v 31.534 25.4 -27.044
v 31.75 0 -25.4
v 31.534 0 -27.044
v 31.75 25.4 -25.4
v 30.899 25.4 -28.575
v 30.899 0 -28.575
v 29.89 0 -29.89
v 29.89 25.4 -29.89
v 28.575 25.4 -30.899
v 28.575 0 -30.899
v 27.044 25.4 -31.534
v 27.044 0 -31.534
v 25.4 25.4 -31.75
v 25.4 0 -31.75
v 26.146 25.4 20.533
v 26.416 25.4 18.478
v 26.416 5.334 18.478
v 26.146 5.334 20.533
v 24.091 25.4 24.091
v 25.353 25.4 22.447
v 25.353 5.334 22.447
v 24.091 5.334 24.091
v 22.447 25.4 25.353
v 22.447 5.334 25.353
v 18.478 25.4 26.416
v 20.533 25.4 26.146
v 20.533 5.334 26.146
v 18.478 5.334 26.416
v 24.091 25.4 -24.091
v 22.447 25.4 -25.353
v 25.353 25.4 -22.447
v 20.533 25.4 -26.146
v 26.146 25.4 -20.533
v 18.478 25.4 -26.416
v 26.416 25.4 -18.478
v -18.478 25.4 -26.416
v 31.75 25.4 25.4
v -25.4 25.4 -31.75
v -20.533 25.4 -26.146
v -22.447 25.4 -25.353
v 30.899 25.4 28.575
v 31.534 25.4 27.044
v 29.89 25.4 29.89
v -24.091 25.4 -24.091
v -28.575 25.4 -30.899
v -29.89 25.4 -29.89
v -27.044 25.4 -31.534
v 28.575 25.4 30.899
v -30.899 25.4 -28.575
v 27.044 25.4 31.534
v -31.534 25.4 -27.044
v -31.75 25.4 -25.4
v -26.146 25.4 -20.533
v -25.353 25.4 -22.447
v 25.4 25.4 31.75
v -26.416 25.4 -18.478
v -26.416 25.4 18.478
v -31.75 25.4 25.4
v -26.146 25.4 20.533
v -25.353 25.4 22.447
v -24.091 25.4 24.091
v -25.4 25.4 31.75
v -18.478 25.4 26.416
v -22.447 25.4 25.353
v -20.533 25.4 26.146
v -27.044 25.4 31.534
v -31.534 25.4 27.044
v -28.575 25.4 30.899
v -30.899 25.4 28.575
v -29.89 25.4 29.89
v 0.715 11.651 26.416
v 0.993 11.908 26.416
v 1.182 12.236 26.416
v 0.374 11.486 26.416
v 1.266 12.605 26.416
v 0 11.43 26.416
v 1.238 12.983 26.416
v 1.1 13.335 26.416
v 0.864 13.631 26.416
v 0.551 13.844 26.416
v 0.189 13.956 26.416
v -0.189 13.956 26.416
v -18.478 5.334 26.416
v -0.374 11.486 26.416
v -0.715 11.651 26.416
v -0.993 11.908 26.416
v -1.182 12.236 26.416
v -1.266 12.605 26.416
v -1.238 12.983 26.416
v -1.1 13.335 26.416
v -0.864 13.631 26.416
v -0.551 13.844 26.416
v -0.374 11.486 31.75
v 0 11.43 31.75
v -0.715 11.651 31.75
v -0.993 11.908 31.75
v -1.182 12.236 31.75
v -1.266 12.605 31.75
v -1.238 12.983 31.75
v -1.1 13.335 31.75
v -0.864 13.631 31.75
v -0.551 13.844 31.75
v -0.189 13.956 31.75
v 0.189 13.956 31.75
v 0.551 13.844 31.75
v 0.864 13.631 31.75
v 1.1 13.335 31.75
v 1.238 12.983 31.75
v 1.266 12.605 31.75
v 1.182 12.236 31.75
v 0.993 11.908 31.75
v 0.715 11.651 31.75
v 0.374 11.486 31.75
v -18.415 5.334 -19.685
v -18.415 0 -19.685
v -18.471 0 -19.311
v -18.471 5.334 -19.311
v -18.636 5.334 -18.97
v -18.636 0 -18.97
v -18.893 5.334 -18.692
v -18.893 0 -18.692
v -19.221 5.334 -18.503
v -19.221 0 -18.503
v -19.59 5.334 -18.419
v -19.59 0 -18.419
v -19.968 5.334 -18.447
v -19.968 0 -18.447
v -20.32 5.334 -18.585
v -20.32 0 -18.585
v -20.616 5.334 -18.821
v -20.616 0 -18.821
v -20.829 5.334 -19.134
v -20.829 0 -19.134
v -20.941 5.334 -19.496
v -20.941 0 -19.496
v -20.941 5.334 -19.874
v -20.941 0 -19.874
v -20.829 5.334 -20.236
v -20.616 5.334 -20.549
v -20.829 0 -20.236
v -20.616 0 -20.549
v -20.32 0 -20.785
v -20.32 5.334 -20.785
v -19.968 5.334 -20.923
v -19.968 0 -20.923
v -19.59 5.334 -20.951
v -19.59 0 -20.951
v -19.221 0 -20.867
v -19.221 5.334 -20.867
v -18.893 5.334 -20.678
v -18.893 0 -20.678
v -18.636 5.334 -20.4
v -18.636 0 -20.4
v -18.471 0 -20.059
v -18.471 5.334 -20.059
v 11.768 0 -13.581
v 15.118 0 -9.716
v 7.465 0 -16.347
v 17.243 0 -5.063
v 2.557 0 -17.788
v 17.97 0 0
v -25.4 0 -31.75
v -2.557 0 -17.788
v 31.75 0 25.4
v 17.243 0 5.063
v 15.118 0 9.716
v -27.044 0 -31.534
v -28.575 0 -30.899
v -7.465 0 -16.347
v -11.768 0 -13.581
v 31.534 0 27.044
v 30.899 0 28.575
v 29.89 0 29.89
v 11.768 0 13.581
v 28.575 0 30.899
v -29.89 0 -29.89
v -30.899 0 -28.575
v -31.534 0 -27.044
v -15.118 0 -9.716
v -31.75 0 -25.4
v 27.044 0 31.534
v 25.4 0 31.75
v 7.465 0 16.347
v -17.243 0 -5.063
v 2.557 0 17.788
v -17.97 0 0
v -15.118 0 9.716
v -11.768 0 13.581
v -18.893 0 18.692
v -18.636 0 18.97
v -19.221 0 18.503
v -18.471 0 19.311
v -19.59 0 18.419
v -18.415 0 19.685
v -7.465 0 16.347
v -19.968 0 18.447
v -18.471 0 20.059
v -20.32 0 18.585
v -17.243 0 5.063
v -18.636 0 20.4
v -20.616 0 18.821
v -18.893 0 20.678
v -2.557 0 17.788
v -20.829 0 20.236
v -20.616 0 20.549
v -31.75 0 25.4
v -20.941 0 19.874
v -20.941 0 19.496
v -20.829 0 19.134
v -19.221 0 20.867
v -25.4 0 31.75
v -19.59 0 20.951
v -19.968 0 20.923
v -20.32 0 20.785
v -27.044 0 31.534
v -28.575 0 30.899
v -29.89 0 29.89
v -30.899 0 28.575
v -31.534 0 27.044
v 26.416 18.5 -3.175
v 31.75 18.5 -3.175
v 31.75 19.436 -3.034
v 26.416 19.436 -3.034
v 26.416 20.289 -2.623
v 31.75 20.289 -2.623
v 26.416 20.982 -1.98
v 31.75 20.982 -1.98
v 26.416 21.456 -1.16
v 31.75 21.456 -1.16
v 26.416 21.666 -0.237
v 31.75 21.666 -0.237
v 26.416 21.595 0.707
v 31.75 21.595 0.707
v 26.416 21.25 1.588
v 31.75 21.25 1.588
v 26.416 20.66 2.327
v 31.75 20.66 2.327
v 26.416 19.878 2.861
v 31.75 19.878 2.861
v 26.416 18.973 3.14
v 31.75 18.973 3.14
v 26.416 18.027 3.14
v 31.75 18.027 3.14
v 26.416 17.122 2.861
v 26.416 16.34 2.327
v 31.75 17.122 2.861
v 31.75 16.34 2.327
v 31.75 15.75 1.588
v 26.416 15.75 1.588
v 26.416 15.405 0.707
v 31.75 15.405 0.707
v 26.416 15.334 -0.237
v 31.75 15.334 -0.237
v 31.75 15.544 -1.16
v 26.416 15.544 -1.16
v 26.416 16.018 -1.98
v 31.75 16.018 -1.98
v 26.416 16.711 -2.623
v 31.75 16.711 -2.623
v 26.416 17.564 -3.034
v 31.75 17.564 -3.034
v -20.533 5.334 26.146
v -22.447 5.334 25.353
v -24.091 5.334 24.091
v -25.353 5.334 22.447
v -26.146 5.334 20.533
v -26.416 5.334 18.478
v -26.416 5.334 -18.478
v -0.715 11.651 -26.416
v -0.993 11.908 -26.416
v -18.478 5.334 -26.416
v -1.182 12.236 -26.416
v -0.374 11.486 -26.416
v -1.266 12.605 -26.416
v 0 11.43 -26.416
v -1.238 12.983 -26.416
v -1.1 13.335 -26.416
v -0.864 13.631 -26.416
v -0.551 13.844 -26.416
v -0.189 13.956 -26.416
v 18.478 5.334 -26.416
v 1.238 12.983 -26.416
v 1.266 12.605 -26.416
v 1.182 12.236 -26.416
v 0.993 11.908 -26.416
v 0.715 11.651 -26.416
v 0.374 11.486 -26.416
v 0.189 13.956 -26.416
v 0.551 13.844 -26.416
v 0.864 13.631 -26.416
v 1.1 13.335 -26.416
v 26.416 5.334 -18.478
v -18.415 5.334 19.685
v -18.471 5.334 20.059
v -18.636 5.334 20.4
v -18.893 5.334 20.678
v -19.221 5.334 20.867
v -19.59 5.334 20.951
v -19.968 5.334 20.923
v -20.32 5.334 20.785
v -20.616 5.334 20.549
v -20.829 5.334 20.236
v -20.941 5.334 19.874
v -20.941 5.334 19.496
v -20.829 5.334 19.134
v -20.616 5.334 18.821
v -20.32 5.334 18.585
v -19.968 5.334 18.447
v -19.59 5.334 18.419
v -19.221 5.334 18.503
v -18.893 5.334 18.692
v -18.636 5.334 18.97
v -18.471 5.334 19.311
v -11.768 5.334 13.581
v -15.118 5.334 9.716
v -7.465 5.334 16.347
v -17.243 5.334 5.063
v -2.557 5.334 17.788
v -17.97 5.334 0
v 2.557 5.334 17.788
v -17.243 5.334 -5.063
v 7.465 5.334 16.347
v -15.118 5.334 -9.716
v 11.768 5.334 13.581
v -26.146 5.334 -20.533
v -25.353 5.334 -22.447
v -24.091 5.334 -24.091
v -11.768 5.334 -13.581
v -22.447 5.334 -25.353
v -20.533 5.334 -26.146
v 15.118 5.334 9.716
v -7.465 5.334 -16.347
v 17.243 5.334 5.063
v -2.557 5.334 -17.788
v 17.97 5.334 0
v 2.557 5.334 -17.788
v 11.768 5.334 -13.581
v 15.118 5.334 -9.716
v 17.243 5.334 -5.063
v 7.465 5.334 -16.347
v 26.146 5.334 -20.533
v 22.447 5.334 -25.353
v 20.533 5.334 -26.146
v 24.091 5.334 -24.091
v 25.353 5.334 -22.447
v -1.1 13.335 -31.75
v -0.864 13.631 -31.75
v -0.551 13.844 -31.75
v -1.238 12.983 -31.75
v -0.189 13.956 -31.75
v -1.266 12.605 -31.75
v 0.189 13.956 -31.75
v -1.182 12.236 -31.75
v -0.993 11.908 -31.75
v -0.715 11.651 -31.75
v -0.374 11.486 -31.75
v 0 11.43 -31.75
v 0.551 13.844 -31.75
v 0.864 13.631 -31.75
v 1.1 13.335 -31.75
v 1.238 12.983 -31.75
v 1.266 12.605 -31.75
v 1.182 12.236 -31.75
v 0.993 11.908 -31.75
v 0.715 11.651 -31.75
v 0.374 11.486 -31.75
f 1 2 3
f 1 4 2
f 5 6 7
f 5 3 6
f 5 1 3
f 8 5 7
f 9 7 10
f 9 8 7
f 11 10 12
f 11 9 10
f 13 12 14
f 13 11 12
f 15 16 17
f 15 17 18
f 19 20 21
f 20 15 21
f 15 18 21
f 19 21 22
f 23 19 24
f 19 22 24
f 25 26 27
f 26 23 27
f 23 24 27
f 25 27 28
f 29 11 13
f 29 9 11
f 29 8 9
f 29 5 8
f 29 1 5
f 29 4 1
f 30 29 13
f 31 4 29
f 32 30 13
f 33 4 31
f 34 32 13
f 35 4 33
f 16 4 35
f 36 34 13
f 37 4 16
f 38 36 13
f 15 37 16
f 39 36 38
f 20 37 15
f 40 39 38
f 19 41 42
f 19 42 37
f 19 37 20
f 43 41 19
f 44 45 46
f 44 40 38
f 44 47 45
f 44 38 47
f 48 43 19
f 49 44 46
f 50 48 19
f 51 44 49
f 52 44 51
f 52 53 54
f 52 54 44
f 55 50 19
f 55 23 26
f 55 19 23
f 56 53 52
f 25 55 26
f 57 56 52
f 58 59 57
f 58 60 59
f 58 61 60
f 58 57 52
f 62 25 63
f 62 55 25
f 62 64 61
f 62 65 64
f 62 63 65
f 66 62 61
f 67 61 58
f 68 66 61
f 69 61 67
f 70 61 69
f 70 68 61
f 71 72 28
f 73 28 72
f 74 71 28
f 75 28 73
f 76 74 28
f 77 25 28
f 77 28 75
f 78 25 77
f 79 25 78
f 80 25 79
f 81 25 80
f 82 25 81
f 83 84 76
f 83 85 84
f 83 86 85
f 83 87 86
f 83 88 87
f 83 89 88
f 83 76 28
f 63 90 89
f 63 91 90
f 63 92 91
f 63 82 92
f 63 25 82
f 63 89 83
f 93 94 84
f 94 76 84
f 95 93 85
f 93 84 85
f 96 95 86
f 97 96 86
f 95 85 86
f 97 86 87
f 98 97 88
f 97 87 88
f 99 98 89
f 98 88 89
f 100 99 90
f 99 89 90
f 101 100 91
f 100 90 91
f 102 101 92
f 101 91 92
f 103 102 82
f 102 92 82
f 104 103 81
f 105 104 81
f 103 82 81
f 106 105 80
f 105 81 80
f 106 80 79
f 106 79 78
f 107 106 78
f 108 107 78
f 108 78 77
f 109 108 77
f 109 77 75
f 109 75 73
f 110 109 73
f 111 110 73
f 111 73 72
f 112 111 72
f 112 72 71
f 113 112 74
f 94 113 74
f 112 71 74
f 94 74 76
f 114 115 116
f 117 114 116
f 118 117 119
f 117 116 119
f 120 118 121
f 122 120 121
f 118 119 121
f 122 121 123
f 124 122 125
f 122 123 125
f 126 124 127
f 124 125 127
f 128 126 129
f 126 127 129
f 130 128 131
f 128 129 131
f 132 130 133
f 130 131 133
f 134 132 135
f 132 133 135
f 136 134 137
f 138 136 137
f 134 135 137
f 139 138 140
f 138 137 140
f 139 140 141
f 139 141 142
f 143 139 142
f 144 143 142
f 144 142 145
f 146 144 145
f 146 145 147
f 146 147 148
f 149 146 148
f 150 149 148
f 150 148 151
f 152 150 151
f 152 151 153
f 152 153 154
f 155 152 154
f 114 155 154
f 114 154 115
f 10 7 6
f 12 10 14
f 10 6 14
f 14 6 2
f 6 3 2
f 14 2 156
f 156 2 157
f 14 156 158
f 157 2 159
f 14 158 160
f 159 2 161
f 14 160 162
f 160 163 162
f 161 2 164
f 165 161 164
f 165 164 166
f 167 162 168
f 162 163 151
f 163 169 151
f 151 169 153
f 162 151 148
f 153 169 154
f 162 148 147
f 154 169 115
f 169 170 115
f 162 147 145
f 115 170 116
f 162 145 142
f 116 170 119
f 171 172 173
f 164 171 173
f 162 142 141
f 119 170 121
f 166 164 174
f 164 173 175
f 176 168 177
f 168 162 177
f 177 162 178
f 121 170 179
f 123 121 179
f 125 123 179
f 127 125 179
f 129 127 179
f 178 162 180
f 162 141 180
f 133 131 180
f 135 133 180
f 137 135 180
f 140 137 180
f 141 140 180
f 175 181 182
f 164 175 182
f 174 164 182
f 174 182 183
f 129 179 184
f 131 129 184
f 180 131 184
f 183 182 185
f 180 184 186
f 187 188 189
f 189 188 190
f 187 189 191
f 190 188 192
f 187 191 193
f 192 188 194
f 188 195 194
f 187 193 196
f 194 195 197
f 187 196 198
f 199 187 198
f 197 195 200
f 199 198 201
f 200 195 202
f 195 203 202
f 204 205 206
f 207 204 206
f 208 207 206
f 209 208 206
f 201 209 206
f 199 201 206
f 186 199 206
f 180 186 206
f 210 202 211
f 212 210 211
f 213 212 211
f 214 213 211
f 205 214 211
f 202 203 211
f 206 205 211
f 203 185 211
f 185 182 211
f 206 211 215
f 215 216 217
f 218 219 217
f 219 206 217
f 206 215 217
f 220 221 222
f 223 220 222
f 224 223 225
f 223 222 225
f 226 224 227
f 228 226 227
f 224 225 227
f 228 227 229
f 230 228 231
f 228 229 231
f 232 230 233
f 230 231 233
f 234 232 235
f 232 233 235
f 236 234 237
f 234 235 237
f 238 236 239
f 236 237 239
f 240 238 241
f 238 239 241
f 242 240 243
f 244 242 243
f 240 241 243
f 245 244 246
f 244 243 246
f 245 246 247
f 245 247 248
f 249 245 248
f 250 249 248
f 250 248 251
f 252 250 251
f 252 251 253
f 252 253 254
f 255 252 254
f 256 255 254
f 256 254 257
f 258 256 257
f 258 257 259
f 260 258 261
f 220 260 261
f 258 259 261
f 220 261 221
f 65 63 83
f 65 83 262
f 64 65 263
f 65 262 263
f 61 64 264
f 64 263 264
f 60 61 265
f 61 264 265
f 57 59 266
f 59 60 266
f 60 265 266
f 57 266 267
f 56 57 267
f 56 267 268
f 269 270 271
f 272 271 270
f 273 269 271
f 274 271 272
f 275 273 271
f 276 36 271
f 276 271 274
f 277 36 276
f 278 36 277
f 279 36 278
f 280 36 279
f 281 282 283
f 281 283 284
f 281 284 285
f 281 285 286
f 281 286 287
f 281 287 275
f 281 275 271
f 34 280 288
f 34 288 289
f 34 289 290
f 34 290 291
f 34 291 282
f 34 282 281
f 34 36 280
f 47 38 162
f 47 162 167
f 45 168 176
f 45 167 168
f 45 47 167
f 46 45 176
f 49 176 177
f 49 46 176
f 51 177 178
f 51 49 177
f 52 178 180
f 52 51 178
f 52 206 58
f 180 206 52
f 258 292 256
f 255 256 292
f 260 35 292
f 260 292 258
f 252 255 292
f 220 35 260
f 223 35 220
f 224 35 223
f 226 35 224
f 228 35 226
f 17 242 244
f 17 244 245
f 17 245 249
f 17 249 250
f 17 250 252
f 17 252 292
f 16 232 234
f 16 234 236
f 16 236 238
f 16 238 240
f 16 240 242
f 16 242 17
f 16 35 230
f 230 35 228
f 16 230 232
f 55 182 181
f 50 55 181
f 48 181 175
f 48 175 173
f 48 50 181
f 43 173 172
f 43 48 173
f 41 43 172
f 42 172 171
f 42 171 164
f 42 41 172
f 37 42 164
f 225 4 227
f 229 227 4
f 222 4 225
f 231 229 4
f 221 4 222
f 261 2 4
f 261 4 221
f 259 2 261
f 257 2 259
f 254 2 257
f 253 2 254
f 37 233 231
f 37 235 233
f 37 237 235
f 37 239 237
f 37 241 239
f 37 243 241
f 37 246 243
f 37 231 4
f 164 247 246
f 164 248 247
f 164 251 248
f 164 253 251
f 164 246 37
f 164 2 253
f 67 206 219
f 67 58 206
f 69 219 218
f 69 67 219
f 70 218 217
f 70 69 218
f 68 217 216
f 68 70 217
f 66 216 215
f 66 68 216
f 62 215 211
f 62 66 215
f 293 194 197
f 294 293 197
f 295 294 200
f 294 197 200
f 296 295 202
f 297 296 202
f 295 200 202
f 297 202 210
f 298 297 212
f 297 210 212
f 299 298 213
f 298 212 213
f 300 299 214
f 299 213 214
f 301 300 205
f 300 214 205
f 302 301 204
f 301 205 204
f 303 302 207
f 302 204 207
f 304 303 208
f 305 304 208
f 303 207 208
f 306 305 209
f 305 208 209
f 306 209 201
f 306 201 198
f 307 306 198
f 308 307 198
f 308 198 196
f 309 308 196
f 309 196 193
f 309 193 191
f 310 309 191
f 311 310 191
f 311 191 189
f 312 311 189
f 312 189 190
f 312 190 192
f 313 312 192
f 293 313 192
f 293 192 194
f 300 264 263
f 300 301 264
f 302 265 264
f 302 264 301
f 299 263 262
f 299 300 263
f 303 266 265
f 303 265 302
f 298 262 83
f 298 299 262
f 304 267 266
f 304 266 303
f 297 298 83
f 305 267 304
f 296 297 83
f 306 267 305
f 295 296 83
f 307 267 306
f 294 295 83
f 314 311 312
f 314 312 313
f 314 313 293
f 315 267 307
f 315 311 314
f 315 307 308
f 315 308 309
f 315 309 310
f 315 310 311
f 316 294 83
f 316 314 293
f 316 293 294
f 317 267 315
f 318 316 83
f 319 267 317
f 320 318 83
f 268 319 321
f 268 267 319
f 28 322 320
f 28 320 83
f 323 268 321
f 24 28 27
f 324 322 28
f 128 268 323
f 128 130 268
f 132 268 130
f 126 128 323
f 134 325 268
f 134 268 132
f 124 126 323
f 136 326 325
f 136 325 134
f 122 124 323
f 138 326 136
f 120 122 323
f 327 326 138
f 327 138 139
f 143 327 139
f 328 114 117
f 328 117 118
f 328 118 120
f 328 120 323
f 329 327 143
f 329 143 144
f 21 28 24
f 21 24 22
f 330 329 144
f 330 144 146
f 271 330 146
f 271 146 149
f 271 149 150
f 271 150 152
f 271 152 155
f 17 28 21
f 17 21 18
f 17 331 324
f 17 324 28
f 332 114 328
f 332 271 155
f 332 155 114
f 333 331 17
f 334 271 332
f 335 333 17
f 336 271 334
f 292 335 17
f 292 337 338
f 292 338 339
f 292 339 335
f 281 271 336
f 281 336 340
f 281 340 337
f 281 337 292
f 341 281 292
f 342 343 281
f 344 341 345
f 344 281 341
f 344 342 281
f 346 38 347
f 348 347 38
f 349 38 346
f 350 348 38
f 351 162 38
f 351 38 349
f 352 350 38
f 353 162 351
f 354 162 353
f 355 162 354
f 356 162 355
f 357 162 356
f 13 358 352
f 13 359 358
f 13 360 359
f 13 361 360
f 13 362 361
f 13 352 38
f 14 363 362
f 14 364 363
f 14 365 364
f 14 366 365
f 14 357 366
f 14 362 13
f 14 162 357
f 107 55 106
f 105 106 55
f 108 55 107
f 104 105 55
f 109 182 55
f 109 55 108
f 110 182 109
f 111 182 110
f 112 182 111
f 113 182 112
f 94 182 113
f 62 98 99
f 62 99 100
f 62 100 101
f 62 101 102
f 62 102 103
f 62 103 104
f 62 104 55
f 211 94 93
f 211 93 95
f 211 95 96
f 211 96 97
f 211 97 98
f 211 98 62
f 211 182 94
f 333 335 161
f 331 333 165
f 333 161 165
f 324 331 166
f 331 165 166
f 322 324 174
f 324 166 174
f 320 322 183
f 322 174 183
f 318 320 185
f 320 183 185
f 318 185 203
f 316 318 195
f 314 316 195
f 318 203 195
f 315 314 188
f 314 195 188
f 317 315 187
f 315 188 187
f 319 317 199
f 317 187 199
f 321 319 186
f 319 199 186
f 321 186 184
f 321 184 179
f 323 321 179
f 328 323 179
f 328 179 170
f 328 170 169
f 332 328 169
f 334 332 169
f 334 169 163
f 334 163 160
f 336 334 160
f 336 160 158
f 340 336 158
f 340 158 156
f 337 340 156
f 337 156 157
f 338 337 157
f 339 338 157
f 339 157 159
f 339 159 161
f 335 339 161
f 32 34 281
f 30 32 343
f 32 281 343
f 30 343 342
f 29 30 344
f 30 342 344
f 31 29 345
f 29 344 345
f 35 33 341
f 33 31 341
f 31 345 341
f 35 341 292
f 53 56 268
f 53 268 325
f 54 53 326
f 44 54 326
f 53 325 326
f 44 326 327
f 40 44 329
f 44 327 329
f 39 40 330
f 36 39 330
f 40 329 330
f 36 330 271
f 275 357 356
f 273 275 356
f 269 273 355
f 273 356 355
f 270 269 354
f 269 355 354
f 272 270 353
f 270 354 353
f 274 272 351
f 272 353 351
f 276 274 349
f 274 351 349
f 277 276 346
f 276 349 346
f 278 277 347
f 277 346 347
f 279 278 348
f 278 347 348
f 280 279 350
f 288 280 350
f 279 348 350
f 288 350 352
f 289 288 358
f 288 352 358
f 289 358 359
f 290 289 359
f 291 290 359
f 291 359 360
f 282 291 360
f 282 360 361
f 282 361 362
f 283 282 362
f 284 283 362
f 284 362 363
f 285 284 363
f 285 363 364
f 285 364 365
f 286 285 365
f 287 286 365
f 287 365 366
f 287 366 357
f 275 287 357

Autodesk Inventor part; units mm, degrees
ref_plane "YZ Plane" through (0, 0, 0) normal (1, 0, 0) x (0, 1, 0)
ref_plane "XZ Plane" through (0, 0, 0) normal (0, 1, 0) x (-1, 0, 0)
sketch "Sketch2" plane through (0, 0, 0) normal (0, 1, 0) x (-1, 0, 0)
  line L0 (-31.75, 31.75) -> (31.75, 31.75)
  line L1 (31.75, 31.75) -> (31.75, -31.75)
  line L2 (31.75, -31.75) -> (-31.75, -31.75)
  line L3 (-31.75, -31.75) -> (-31.75, 31.75)
  line L4 (-31.75, 31.75) -> (31.75, -31.75) construction
  line L5 (31.75, 31.75) -> (-31.75, -31.75) construction
  point P0 (0, 0)
  dimension "d3" = 63.5
  dimension "d4" = 63.5
extrude "Extrusion2" add sketch "Sketch2" along normal blind 25.4
fillet "Fillet1" radius 6.35 4 edges at (31.75, 12.7, 31.75) (31.75, 12.7, -31.75) (-31.75, 12.7, -31.75) (-31.75, 12.7, 31.75)
sketch "Sketch3" plane through (0, 25.4, 0) normal (0, 1, 0) x (1, 0, 0)
  arc A0 (-31.75, -25.4) -> (-25.4, -31.75) centre (-25.4, -25.4) ccw projected
  line L0 (-25.4, -31.75) -> (25.4, -31.75) projected
  arc A1 (25.4, -31.75) -> (31.75, -25.4) centre (25.4, -25.4) ccw projected
  line L1 (31.75, -25.4) -> (31.75, 25.4) projected
  arc A2 (31.75, 25.4) -> (25.4, 31.75) centre (25.4, 25.4) ccw projected
  line L2 (25.4, 31.75) -> (-25.4, 31.75) projected
  arc A3 (-25.4, 31.75) -> (-31.75, 25.4) centre (-25.4, 25.4) ccw projected
  line L3 (-31.75, 25.4) -> (-31.75, -25.4) projected
  line L4 (-26.416, 26.416) -> (26.416, 26.416)
  line L5 (26.416, 26.416) -> (26.416, -26.416)
  line L6 (26.416, -26.416) -> (-26.416, -26.416)
  line L7 (-26.416, -26.416) -> (-26.416, 26.416)
  point P0 (0, 0)
  dimension "d8" = 5.334
extrude "Extrusion3" cut sketch "Sketch3" against normal blind 20.066 contours L4 L5 L6 L7
ref_plane "Work Plane1" through (0, 25.4, -26.416) normal (-1, 0, 0) x (0, 0, 1)
fillet "Fillet2" radius 7.9375 4 edges at (-26.416, 15.367, 26.416) (-26.416, 15.367, -26.416) (26.416, 15.367, -26.416) (26.416, 15.367, 26.416)
sketch "Sketch6" plane through (-25.4, 0, 31.75) normal (0, 0, 1) x (1, 0, 0)
  line L0 (0, 0) -> (0, 25.4) projected
  line L1 (50.8, 0) -> (0, 0) projected
  line L2 (50.8, 25.4) -> (50.8, 0) projected
  line L3 (0, 25.4) -> (50.8, 25.4) projected
  circle A0 centre (25.4, 12.7) radius 1.27
  point P0 (25.4, 0)
  dimension "d31" = 2.54
  dimension "d32" = 12.7
  dimension "d33" = 25.4
hole "Hole3" at (0, 12.7, 31.75) direction (0, 0, -1) diameter 2.54 depth 76.2 tip angle 118
sketch "Sketch8" plane through (0, 0, 0) normal (0, -1, 0) x (1, 0, 0)
  point P0 (0, 0)
sketch "Sketch9" plane through (0, 0, 0) normal (0, -1, 0) x (1, 0, 0)
  line L0 (25.4, 28.575) -> (-15.875, 28.575)
  arc A0 (-15.875, 28.575) -> (-28.575, 15.875) centre (-15.875, 15.875) ccw
  line L1 (-28.575, 15.875) -> (-28.575, -15.875)
  arc A1 (-28.575, -15.875) -> (-15.875, -28.575) centre (-15.875, -15.875) ccw
  line L2 (-15.875, -28.575) -> (25.4, -28.575)
  arc A2 (25.4, -28.575) -> (28.575, -25.4) centre (25.4, -25.4) ccw
  line L3 (28.575, -25.4) -> (28.575, -1.27)
  line L4 (28.575, -1.27) -> (17.9256, -1.27)
  circle A3 centre (0, 0) radius 17.9705
  line L5 (17.9256, 1.27) -> (28.575, 1.27)
  line L6 (28.575, 1.27) -> (28.575, 25.4)
  arc A4 (28.575, 25.4) -> (25.4, 28.575) centre (25.4, 25.4) ccw
  circle A5 centre (-19.685, -19.685) radius 1.27
  circle A6 centre (-19.685, 19.685) radius 1.27
  dimension "d53" = 2.54
  dimension "d54" = 3.81
  dimension "d55" = 3.81
  dimension "d56" = 2.54
  dimension "d57" = 3.81
  dimension "d58" = 3.81
extrude "Extrusion6" cut sketch "Sketch9" against normal blind 25.4 contours A3 | A5 | A6
sketch "Sketch10" plane through (31.75, 0, 25.4) normal (1, 0, 0) x (0, 0, -1)
  circle A0 centre (25.4, 18.5) radius 3.175
  point P0 (25.4, 0)
  dimension "d61" = 6.35
extrude "Extrusion7" cut sketch "Sketch10" against normal blind 6.35
properties part number "basemotor"
